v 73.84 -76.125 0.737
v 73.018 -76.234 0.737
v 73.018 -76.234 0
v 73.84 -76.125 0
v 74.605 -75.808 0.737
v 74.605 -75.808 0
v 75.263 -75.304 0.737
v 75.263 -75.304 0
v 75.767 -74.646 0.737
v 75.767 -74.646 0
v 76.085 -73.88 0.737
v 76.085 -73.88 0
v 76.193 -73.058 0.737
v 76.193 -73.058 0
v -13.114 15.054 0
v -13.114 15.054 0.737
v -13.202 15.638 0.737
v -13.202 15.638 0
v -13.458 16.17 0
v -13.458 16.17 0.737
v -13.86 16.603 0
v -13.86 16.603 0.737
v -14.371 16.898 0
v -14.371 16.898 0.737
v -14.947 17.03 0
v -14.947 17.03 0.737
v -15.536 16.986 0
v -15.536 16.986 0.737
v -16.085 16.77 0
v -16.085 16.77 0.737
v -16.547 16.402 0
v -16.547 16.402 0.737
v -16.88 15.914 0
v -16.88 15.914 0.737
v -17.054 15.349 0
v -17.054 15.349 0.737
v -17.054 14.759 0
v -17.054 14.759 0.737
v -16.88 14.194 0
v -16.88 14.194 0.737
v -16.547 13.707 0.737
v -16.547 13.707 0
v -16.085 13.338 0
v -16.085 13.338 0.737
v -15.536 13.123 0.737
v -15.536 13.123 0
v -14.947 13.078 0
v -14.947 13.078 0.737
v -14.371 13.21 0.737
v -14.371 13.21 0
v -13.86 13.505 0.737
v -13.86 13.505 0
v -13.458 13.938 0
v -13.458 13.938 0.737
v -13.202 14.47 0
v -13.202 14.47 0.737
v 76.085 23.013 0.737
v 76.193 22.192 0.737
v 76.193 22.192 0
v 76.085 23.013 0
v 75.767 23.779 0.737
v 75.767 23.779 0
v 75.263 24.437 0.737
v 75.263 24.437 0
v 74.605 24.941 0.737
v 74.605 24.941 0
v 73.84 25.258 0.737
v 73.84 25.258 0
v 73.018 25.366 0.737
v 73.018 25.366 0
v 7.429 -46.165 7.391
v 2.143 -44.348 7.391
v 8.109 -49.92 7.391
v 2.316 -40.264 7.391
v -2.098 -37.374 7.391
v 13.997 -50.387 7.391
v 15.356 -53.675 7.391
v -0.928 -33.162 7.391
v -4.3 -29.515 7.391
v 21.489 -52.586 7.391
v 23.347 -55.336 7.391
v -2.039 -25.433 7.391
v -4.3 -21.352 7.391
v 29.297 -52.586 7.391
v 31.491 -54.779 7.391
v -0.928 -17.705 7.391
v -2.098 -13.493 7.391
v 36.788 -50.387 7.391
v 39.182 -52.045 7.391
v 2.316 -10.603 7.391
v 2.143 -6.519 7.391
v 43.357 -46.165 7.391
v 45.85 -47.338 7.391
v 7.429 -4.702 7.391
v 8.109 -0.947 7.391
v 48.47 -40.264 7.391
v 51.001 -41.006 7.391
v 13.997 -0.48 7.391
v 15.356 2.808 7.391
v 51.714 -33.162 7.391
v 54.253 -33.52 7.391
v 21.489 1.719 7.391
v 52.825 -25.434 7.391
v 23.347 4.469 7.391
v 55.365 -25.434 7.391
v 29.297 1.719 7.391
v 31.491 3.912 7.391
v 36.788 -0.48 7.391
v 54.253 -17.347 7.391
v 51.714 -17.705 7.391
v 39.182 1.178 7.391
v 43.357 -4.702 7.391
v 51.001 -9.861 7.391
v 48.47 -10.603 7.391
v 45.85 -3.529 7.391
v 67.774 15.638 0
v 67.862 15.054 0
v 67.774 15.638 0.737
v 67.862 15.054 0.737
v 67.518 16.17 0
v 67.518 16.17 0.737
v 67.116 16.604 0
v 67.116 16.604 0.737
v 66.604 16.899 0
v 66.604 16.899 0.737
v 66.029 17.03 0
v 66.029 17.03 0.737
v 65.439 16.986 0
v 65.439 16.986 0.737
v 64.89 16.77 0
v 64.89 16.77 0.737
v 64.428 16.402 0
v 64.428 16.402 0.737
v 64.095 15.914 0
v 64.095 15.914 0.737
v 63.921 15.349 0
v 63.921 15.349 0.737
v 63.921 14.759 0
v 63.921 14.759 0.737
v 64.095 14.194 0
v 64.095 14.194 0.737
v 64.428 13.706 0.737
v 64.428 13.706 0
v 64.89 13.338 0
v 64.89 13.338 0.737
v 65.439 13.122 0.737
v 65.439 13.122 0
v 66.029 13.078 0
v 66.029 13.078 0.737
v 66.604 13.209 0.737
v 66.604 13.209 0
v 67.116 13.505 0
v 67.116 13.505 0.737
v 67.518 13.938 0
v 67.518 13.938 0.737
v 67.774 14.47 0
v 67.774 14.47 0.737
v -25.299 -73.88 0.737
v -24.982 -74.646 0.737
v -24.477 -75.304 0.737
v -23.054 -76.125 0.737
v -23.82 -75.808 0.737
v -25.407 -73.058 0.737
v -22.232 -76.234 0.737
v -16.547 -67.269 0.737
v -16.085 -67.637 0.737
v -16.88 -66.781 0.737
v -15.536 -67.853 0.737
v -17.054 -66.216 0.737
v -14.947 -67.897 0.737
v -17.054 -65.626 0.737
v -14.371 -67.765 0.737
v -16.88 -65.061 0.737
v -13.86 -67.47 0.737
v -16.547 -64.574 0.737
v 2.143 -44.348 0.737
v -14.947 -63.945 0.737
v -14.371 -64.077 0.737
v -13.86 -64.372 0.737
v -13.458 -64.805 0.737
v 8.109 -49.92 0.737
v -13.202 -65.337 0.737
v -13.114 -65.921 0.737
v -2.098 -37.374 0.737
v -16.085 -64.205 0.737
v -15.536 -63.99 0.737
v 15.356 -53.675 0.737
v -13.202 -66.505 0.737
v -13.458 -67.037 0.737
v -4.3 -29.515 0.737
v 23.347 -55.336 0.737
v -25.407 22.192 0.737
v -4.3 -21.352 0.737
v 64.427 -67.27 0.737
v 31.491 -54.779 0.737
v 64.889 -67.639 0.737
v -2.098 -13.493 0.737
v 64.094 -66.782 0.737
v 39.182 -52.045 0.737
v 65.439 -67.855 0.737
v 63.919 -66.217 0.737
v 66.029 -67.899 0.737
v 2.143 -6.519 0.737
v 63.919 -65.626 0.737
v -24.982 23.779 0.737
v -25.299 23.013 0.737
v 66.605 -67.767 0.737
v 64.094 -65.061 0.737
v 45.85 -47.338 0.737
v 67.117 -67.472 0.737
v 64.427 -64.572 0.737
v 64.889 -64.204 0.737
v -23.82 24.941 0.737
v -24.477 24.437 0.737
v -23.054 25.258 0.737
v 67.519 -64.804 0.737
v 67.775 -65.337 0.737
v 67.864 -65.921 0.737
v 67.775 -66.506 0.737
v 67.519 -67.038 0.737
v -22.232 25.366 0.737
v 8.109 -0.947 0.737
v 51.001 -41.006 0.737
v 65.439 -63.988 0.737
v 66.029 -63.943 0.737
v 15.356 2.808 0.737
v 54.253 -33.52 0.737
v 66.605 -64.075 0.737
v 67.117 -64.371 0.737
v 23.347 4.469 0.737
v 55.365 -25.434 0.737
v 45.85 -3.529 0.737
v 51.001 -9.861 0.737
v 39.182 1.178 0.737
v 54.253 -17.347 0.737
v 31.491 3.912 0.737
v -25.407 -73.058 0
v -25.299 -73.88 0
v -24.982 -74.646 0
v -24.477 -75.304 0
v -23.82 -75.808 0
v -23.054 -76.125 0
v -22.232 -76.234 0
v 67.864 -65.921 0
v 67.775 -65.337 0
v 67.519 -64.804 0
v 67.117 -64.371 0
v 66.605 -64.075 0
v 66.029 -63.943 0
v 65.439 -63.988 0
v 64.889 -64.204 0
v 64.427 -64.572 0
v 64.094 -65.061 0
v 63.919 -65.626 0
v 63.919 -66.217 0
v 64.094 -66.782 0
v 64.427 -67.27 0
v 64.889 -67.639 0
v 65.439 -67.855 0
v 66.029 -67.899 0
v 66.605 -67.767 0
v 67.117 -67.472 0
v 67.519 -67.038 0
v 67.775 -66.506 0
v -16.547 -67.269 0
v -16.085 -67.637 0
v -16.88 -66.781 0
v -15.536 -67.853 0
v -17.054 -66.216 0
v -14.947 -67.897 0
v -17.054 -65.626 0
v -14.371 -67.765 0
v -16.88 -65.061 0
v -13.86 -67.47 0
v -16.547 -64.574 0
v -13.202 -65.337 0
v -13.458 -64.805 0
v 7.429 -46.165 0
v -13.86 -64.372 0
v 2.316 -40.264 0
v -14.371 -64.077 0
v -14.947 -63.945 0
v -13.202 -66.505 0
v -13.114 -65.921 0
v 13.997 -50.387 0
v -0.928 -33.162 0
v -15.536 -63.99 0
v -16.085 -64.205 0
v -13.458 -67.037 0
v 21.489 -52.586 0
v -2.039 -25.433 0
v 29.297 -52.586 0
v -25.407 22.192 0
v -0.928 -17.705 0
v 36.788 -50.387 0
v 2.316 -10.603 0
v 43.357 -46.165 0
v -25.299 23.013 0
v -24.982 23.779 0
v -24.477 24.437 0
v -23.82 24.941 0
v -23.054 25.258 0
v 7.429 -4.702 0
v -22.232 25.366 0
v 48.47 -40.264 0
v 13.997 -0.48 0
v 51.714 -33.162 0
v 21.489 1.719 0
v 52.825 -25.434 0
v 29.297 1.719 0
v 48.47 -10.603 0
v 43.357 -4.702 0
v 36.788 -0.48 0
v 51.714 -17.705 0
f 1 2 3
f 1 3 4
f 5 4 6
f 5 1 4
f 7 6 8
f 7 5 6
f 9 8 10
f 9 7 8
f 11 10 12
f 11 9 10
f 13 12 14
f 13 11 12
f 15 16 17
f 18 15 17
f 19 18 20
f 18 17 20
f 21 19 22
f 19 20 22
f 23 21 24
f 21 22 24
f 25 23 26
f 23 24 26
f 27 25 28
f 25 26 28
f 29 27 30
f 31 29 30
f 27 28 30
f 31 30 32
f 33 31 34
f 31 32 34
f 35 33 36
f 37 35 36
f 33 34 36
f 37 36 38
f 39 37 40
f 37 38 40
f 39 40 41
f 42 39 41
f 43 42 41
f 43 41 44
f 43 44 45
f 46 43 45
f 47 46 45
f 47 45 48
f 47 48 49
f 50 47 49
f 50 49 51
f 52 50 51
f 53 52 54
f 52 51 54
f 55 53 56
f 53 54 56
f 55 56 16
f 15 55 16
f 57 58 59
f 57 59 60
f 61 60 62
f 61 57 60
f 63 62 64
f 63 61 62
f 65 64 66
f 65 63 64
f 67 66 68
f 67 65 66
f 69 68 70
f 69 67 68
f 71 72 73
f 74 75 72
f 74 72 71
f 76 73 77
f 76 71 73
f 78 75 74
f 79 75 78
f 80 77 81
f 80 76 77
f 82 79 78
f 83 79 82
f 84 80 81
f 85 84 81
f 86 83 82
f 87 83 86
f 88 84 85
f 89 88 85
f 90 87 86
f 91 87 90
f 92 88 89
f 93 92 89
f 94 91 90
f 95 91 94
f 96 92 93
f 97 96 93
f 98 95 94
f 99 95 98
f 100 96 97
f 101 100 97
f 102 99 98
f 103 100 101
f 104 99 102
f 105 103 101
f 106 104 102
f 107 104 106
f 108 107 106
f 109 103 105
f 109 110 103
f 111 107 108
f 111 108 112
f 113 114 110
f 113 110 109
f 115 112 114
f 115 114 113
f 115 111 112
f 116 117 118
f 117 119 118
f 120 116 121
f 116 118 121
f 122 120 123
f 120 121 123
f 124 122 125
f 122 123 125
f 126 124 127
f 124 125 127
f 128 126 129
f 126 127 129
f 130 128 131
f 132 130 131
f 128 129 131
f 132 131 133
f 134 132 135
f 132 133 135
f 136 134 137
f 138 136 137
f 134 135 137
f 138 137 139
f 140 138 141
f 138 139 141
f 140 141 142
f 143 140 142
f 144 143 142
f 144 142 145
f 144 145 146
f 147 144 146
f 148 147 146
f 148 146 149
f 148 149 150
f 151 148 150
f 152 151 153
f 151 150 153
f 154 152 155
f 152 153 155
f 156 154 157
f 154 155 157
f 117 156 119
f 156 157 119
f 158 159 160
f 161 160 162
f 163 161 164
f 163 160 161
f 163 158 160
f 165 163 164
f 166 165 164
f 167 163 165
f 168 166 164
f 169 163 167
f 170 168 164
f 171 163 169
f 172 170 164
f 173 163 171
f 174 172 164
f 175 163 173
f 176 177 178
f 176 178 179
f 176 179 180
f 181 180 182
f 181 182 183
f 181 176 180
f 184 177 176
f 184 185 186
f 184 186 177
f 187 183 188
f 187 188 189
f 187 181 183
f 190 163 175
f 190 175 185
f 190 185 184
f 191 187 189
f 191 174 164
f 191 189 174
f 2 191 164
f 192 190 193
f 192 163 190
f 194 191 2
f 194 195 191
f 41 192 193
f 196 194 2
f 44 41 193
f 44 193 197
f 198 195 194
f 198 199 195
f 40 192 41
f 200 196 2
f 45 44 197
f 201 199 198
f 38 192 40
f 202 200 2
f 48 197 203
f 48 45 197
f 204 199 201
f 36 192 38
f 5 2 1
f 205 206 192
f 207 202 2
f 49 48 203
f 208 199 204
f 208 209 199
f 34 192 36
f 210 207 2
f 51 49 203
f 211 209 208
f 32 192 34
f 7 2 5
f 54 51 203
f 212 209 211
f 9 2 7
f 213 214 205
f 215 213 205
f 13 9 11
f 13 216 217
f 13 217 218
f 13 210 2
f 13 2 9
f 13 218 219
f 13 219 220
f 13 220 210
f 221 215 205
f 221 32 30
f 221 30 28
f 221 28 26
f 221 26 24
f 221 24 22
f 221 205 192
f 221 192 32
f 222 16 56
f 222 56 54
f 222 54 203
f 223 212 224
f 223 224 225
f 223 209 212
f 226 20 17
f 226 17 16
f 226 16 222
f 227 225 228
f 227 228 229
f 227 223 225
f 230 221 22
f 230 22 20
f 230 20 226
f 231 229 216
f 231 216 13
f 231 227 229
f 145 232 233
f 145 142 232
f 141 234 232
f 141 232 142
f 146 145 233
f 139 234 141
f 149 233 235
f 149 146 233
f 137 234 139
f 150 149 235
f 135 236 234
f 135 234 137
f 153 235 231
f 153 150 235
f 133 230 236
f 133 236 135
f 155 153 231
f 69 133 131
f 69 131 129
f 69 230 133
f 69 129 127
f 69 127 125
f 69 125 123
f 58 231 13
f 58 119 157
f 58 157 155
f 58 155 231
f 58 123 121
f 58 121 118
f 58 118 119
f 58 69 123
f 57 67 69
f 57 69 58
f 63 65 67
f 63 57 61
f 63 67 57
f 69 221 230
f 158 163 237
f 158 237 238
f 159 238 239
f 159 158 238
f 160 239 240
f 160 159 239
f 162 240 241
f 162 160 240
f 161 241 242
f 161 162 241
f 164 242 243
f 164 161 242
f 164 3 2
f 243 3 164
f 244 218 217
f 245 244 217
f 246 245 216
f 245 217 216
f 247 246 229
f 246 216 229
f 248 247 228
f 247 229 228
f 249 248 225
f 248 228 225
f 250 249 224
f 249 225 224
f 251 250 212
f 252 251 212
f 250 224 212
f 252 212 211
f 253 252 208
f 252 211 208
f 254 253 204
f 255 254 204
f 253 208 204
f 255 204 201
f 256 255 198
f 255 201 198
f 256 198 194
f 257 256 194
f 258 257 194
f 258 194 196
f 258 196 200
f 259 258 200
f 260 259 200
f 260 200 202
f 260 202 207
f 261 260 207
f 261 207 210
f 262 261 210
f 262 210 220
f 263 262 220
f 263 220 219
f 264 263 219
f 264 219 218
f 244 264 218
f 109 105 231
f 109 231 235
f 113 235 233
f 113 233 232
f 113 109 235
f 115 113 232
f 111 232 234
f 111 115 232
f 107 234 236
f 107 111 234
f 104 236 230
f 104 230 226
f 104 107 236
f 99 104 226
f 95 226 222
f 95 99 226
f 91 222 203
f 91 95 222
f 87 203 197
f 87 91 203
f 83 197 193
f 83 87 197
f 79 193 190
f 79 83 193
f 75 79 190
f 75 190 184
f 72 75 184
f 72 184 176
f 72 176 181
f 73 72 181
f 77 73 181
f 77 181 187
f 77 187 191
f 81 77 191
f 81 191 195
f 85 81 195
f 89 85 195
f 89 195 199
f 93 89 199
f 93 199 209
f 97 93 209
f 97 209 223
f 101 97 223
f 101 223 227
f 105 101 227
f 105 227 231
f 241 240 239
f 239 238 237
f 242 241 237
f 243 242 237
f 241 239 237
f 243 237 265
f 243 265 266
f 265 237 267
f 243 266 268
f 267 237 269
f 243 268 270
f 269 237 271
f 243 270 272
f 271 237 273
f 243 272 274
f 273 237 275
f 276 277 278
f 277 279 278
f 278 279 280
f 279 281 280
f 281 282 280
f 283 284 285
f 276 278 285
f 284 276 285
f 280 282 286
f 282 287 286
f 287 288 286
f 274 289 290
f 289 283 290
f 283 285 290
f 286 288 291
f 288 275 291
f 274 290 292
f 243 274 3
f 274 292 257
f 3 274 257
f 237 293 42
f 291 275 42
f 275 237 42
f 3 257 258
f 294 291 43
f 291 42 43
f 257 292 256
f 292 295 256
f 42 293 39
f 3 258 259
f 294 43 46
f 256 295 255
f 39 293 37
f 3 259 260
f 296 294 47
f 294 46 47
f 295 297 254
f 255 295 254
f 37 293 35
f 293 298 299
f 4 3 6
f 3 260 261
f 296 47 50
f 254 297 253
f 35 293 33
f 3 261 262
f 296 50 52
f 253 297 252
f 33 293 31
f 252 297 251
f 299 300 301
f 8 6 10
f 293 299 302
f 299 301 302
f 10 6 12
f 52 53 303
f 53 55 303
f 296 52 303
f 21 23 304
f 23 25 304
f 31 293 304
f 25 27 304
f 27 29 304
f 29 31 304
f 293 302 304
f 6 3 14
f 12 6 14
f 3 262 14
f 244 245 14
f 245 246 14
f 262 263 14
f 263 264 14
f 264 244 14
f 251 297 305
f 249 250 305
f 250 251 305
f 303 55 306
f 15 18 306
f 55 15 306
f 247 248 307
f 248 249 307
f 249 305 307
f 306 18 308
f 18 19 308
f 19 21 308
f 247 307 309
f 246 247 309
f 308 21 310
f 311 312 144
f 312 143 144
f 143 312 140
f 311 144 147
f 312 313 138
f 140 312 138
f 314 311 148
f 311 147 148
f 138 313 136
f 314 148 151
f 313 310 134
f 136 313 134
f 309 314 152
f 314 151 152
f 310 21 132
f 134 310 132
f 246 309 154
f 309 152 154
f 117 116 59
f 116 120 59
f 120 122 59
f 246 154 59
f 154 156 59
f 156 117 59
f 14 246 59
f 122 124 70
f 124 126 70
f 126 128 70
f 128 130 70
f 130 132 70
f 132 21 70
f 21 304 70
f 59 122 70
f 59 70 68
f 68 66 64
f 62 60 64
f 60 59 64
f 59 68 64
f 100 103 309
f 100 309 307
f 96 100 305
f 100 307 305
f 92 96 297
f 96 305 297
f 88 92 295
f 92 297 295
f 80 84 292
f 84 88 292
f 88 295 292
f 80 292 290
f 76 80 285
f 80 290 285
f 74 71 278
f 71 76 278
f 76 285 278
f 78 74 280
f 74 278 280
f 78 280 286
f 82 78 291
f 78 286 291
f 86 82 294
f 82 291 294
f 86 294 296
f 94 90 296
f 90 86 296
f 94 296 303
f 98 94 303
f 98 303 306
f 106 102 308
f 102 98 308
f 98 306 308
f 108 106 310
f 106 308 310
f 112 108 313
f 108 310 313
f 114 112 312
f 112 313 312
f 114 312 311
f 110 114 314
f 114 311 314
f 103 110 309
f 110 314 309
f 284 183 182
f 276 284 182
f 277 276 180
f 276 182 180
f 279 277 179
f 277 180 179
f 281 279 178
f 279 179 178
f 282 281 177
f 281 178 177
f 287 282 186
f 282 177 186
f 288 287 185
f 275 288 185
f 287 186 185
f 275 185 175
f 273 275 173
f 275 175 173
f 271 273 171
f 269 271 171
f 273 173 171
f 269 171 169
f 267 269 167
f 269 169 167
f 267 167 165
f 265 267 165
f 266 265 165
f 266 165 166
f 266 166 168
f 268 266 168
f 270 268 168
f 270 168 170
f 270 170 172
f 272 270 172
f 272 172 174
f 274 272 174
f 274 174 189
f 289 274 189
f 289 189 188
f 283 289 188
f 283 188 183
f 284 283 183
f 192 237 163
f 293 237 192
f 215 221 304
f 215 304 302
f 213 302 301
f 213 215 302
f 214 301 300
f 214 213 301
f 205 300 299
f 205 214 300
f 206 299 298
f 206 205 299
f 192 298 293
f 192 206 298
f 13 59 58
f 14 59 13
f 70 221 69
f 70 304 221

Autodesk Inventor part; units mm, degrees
ref_plane "YZ Plane" through (0, 0, 0) normal (1, 0, 0) x (0, 1, 0)
ref_plane "XZ Plane" through (0, 0, 0) normal (0, 1, 0) x (-1, 0, 0)
ref_plane "XY Plane" through (0, 0, 0) normal (0, 0, 1) x (1, 0, 0)
sketch "Sketch1" plane through (0, 0, 0) normal (0, 0, 1) x (1, 0, 0)
  line L0 (-25.4072, 25.3665) -> (76.1928, 25.3665)
  line L1 (76.1928, 25.3665) -> (76.1928, -76.2335)
  line L2 (76.1928, -76.2335) -> (-25.4072, -76.2335)
  line L3 (-25.4072, -76.2335) -> (-25.4072, 25.3665)
  point P0 (0, 0)
  dimension "d0" = 101.6
  dimension "d1" = 101.6
extrude "Extrusion1" add sketch "Sketch1" along normal blind 0.7366
sketch "Sketch2" plane through (0, 0, 0.7366) normal (0, 0, 1) x (1, 0, 0)
  line L0 (-25.4072, 25.3665) -> (76.1928, -76.2335)
  line L1 (76.1928, 25.3665) -> (-25.4072, -76.2335)
  circle A0 centre (25.3928, -25.4335) radius 27.432
  point P0 (0, 0)
  dimension "d4" = 54.864
extrude "Extrusion2" cut sketch "Sketch2" against normal blind 0.7366
sketch "Sketch3" plane through (0, 0, 0.7366) normal (0, 0, 1) x (1, 0, 0)
  line L0 (-25.4072, -76.2335) -> (-25.4072, 25.3665) projected
  line L1 (-25.4072, 25.3665) -> (-25.4072, -25.4335)
  line L2 (-25.4072, -25.4335) -> (-25.4072, 19.4102)
  line L3 (-25.4072, 25.3665) -> (76.1928, -76.2335)
  line L4 (76.1928, 25.3665) -> (-25.4072, -76.2335)
  circle A0 centre (-19.4509, 19.4102) radius 1.9812
  point P0 (0, 0)
  dimension "d7" = 44.8437
  dimension "d8" = 3.9624
extrude "Extrusion3" cut sketch "Sketch3" against normal blind 0.7366 contours A0 L3 | L3 A0
sketch "Sketch4" plane through (0, 0, 0.7366) normal (0, 0, 1) x (1, 0, 0)
  line L0 (-25.4072, -76.2335) -> (76.1928, 25.3665)
  line L1 (-25.4072, 25.3665) -> (76.1928, -76.2335)
  circle A0 centre (70.2365, 19.4102) radius 1.9819
  circle A1 centre (70.2365, -70.2772) radius 1.983
  circle A2 centre (-19.4509, -70.2772) radius 1.9812
  point P0 (0, 0)
extrude "Extrusion4" cut sketch "Sketch4" against normal blind 0.7366
sketch "Sketch5" plane through (0, 0, 0.7366) normal (0, 0, 1) x (1, 0, 0)
  circle A0 centre (25.3928, -25.4335) radius 27.432 projected
  circle A1 centre (25.3928, -25.4335) radius 29.972
  circle A2 centre (25.3928, -25.4335) radius 32.512
  point P0 (0, 0)
  dimension "d13" = 59.944
  dimension "d14" = 65.024
extrude "Extrusion5" add sketch "Sketch5" along normal blind 6.6548 contours A2
fillet "Fillet1" radius 3.175 4 edges at (-25.4072, 25.3665, 0.3683) (76.1928, 25.3665, 0.3683) (76.1928, -76.2335, 0.3683) (-25.4072, -76.2335, 0.3683)
sketch "Sketch6" plane through (25.3928, -25.4335, 0.7366) normal (0, 0, 1) x (1, 0, 0)
  circle A0 centre (0, 0) radius 29.972 projected
  circle A1 centre (0, 0) radius 27.432 projected
  point P0 (-25.3928, 25.4335)
extrude "Extrusion6" add sketch "Sketch6" along normal blind 9.1948
sketch "Sketch7" plane through (25.3928, -25.4335, 7.3914) normal (0, 0, 1) x (1, 0, 0)
  circle A0 centre (0, 0) radius 29.972 projected
  circle A1 centre (0, 0) radius 32.512 projected
  point P0 (-25.3928, 25.4335)
extrude "Extrusion7" cut sketch "Sketch7" against normal blind 6.6548
sketch "Sketch8" plane through (25.3928, -25.4335, 9.9314) normal (0, 0, 1) x (1, 0, 0)
  circle A0 centre (0, 0) radius 27.432 projected
  circle A1 centre (0, 0) radius 29.972 projected
  point P0 (-25.3928, 25.4335)
extrude "Extrusion8" cut sketch "Sketch8" against normal blind 2.54
sketch "Sketch9" plane through (0, 0, 0.7366) normal (0, 0, 1) x (1, 0, 0)
  circle A0 centre (-19.4509, 19.4102) radius 1.9812 projected
  circle A1 centre (70.2365, -70.2772) radius 1.983 projected
  circle A2 centre (-19.4509, -70.2772) radius 1.9812 projected
  circle A3 centre (70.2365, 19.4102) radius 1.9819 projected
  point P0 (0, 0)
extrude "Extrusion9" add sketch "Sketch9" against normal blind 0.7366
sketch "Sketch10" plane through (0, 0, 0.7366) normal (0, 0, 1) x (1, 0, 0)
  line L0 (-25.4072, 25.3665) -> (76.1928, 25.3665)
  line L1 (76.1928, 25.3665) -> (76.1928, -76.2335)
  line L2 (76.1928, -76.2335) -> (-25.4072, -76.2335)
  line L3 (-25.4072, -76.2335) -> (-25.4072, 25.3665)
  line L4 (-25.4072, 25.3665) -> (76.1928, -76.2335)
  line L5 (-25.4072, -76.2335) -> (76.1928, 25.3665)
  line L6 (-25.4072, 25.3665) -> (-25.4072, -25.4335)
  line L7 (-25.4072, -25.4335) -> (-25.4072, 15.0541)
  circle A0 centre (-15.0948, 15.0541) radius 1.9812
  circle A1 centre (65.8804, 15.0541) radius 1.9818
  circle A2 centre (65.8804, -65.9211) radius 1.9832
  circle A3 centre (-15.0948, -65.9211) radius 1.9812
  point P0 (0, 0)
  dimension "d26" = 40.4876
  dimension "d27" = 3.9624
extrude "Extrusion10" cut sketch "Sketch10" against normal blind 0.7366 contours A0 L4 | L4 A0 | A1 L5 | L5 A1 | A2 L4 | L4 A2 | A3 L5 | L5 A3
properties part number "2"
